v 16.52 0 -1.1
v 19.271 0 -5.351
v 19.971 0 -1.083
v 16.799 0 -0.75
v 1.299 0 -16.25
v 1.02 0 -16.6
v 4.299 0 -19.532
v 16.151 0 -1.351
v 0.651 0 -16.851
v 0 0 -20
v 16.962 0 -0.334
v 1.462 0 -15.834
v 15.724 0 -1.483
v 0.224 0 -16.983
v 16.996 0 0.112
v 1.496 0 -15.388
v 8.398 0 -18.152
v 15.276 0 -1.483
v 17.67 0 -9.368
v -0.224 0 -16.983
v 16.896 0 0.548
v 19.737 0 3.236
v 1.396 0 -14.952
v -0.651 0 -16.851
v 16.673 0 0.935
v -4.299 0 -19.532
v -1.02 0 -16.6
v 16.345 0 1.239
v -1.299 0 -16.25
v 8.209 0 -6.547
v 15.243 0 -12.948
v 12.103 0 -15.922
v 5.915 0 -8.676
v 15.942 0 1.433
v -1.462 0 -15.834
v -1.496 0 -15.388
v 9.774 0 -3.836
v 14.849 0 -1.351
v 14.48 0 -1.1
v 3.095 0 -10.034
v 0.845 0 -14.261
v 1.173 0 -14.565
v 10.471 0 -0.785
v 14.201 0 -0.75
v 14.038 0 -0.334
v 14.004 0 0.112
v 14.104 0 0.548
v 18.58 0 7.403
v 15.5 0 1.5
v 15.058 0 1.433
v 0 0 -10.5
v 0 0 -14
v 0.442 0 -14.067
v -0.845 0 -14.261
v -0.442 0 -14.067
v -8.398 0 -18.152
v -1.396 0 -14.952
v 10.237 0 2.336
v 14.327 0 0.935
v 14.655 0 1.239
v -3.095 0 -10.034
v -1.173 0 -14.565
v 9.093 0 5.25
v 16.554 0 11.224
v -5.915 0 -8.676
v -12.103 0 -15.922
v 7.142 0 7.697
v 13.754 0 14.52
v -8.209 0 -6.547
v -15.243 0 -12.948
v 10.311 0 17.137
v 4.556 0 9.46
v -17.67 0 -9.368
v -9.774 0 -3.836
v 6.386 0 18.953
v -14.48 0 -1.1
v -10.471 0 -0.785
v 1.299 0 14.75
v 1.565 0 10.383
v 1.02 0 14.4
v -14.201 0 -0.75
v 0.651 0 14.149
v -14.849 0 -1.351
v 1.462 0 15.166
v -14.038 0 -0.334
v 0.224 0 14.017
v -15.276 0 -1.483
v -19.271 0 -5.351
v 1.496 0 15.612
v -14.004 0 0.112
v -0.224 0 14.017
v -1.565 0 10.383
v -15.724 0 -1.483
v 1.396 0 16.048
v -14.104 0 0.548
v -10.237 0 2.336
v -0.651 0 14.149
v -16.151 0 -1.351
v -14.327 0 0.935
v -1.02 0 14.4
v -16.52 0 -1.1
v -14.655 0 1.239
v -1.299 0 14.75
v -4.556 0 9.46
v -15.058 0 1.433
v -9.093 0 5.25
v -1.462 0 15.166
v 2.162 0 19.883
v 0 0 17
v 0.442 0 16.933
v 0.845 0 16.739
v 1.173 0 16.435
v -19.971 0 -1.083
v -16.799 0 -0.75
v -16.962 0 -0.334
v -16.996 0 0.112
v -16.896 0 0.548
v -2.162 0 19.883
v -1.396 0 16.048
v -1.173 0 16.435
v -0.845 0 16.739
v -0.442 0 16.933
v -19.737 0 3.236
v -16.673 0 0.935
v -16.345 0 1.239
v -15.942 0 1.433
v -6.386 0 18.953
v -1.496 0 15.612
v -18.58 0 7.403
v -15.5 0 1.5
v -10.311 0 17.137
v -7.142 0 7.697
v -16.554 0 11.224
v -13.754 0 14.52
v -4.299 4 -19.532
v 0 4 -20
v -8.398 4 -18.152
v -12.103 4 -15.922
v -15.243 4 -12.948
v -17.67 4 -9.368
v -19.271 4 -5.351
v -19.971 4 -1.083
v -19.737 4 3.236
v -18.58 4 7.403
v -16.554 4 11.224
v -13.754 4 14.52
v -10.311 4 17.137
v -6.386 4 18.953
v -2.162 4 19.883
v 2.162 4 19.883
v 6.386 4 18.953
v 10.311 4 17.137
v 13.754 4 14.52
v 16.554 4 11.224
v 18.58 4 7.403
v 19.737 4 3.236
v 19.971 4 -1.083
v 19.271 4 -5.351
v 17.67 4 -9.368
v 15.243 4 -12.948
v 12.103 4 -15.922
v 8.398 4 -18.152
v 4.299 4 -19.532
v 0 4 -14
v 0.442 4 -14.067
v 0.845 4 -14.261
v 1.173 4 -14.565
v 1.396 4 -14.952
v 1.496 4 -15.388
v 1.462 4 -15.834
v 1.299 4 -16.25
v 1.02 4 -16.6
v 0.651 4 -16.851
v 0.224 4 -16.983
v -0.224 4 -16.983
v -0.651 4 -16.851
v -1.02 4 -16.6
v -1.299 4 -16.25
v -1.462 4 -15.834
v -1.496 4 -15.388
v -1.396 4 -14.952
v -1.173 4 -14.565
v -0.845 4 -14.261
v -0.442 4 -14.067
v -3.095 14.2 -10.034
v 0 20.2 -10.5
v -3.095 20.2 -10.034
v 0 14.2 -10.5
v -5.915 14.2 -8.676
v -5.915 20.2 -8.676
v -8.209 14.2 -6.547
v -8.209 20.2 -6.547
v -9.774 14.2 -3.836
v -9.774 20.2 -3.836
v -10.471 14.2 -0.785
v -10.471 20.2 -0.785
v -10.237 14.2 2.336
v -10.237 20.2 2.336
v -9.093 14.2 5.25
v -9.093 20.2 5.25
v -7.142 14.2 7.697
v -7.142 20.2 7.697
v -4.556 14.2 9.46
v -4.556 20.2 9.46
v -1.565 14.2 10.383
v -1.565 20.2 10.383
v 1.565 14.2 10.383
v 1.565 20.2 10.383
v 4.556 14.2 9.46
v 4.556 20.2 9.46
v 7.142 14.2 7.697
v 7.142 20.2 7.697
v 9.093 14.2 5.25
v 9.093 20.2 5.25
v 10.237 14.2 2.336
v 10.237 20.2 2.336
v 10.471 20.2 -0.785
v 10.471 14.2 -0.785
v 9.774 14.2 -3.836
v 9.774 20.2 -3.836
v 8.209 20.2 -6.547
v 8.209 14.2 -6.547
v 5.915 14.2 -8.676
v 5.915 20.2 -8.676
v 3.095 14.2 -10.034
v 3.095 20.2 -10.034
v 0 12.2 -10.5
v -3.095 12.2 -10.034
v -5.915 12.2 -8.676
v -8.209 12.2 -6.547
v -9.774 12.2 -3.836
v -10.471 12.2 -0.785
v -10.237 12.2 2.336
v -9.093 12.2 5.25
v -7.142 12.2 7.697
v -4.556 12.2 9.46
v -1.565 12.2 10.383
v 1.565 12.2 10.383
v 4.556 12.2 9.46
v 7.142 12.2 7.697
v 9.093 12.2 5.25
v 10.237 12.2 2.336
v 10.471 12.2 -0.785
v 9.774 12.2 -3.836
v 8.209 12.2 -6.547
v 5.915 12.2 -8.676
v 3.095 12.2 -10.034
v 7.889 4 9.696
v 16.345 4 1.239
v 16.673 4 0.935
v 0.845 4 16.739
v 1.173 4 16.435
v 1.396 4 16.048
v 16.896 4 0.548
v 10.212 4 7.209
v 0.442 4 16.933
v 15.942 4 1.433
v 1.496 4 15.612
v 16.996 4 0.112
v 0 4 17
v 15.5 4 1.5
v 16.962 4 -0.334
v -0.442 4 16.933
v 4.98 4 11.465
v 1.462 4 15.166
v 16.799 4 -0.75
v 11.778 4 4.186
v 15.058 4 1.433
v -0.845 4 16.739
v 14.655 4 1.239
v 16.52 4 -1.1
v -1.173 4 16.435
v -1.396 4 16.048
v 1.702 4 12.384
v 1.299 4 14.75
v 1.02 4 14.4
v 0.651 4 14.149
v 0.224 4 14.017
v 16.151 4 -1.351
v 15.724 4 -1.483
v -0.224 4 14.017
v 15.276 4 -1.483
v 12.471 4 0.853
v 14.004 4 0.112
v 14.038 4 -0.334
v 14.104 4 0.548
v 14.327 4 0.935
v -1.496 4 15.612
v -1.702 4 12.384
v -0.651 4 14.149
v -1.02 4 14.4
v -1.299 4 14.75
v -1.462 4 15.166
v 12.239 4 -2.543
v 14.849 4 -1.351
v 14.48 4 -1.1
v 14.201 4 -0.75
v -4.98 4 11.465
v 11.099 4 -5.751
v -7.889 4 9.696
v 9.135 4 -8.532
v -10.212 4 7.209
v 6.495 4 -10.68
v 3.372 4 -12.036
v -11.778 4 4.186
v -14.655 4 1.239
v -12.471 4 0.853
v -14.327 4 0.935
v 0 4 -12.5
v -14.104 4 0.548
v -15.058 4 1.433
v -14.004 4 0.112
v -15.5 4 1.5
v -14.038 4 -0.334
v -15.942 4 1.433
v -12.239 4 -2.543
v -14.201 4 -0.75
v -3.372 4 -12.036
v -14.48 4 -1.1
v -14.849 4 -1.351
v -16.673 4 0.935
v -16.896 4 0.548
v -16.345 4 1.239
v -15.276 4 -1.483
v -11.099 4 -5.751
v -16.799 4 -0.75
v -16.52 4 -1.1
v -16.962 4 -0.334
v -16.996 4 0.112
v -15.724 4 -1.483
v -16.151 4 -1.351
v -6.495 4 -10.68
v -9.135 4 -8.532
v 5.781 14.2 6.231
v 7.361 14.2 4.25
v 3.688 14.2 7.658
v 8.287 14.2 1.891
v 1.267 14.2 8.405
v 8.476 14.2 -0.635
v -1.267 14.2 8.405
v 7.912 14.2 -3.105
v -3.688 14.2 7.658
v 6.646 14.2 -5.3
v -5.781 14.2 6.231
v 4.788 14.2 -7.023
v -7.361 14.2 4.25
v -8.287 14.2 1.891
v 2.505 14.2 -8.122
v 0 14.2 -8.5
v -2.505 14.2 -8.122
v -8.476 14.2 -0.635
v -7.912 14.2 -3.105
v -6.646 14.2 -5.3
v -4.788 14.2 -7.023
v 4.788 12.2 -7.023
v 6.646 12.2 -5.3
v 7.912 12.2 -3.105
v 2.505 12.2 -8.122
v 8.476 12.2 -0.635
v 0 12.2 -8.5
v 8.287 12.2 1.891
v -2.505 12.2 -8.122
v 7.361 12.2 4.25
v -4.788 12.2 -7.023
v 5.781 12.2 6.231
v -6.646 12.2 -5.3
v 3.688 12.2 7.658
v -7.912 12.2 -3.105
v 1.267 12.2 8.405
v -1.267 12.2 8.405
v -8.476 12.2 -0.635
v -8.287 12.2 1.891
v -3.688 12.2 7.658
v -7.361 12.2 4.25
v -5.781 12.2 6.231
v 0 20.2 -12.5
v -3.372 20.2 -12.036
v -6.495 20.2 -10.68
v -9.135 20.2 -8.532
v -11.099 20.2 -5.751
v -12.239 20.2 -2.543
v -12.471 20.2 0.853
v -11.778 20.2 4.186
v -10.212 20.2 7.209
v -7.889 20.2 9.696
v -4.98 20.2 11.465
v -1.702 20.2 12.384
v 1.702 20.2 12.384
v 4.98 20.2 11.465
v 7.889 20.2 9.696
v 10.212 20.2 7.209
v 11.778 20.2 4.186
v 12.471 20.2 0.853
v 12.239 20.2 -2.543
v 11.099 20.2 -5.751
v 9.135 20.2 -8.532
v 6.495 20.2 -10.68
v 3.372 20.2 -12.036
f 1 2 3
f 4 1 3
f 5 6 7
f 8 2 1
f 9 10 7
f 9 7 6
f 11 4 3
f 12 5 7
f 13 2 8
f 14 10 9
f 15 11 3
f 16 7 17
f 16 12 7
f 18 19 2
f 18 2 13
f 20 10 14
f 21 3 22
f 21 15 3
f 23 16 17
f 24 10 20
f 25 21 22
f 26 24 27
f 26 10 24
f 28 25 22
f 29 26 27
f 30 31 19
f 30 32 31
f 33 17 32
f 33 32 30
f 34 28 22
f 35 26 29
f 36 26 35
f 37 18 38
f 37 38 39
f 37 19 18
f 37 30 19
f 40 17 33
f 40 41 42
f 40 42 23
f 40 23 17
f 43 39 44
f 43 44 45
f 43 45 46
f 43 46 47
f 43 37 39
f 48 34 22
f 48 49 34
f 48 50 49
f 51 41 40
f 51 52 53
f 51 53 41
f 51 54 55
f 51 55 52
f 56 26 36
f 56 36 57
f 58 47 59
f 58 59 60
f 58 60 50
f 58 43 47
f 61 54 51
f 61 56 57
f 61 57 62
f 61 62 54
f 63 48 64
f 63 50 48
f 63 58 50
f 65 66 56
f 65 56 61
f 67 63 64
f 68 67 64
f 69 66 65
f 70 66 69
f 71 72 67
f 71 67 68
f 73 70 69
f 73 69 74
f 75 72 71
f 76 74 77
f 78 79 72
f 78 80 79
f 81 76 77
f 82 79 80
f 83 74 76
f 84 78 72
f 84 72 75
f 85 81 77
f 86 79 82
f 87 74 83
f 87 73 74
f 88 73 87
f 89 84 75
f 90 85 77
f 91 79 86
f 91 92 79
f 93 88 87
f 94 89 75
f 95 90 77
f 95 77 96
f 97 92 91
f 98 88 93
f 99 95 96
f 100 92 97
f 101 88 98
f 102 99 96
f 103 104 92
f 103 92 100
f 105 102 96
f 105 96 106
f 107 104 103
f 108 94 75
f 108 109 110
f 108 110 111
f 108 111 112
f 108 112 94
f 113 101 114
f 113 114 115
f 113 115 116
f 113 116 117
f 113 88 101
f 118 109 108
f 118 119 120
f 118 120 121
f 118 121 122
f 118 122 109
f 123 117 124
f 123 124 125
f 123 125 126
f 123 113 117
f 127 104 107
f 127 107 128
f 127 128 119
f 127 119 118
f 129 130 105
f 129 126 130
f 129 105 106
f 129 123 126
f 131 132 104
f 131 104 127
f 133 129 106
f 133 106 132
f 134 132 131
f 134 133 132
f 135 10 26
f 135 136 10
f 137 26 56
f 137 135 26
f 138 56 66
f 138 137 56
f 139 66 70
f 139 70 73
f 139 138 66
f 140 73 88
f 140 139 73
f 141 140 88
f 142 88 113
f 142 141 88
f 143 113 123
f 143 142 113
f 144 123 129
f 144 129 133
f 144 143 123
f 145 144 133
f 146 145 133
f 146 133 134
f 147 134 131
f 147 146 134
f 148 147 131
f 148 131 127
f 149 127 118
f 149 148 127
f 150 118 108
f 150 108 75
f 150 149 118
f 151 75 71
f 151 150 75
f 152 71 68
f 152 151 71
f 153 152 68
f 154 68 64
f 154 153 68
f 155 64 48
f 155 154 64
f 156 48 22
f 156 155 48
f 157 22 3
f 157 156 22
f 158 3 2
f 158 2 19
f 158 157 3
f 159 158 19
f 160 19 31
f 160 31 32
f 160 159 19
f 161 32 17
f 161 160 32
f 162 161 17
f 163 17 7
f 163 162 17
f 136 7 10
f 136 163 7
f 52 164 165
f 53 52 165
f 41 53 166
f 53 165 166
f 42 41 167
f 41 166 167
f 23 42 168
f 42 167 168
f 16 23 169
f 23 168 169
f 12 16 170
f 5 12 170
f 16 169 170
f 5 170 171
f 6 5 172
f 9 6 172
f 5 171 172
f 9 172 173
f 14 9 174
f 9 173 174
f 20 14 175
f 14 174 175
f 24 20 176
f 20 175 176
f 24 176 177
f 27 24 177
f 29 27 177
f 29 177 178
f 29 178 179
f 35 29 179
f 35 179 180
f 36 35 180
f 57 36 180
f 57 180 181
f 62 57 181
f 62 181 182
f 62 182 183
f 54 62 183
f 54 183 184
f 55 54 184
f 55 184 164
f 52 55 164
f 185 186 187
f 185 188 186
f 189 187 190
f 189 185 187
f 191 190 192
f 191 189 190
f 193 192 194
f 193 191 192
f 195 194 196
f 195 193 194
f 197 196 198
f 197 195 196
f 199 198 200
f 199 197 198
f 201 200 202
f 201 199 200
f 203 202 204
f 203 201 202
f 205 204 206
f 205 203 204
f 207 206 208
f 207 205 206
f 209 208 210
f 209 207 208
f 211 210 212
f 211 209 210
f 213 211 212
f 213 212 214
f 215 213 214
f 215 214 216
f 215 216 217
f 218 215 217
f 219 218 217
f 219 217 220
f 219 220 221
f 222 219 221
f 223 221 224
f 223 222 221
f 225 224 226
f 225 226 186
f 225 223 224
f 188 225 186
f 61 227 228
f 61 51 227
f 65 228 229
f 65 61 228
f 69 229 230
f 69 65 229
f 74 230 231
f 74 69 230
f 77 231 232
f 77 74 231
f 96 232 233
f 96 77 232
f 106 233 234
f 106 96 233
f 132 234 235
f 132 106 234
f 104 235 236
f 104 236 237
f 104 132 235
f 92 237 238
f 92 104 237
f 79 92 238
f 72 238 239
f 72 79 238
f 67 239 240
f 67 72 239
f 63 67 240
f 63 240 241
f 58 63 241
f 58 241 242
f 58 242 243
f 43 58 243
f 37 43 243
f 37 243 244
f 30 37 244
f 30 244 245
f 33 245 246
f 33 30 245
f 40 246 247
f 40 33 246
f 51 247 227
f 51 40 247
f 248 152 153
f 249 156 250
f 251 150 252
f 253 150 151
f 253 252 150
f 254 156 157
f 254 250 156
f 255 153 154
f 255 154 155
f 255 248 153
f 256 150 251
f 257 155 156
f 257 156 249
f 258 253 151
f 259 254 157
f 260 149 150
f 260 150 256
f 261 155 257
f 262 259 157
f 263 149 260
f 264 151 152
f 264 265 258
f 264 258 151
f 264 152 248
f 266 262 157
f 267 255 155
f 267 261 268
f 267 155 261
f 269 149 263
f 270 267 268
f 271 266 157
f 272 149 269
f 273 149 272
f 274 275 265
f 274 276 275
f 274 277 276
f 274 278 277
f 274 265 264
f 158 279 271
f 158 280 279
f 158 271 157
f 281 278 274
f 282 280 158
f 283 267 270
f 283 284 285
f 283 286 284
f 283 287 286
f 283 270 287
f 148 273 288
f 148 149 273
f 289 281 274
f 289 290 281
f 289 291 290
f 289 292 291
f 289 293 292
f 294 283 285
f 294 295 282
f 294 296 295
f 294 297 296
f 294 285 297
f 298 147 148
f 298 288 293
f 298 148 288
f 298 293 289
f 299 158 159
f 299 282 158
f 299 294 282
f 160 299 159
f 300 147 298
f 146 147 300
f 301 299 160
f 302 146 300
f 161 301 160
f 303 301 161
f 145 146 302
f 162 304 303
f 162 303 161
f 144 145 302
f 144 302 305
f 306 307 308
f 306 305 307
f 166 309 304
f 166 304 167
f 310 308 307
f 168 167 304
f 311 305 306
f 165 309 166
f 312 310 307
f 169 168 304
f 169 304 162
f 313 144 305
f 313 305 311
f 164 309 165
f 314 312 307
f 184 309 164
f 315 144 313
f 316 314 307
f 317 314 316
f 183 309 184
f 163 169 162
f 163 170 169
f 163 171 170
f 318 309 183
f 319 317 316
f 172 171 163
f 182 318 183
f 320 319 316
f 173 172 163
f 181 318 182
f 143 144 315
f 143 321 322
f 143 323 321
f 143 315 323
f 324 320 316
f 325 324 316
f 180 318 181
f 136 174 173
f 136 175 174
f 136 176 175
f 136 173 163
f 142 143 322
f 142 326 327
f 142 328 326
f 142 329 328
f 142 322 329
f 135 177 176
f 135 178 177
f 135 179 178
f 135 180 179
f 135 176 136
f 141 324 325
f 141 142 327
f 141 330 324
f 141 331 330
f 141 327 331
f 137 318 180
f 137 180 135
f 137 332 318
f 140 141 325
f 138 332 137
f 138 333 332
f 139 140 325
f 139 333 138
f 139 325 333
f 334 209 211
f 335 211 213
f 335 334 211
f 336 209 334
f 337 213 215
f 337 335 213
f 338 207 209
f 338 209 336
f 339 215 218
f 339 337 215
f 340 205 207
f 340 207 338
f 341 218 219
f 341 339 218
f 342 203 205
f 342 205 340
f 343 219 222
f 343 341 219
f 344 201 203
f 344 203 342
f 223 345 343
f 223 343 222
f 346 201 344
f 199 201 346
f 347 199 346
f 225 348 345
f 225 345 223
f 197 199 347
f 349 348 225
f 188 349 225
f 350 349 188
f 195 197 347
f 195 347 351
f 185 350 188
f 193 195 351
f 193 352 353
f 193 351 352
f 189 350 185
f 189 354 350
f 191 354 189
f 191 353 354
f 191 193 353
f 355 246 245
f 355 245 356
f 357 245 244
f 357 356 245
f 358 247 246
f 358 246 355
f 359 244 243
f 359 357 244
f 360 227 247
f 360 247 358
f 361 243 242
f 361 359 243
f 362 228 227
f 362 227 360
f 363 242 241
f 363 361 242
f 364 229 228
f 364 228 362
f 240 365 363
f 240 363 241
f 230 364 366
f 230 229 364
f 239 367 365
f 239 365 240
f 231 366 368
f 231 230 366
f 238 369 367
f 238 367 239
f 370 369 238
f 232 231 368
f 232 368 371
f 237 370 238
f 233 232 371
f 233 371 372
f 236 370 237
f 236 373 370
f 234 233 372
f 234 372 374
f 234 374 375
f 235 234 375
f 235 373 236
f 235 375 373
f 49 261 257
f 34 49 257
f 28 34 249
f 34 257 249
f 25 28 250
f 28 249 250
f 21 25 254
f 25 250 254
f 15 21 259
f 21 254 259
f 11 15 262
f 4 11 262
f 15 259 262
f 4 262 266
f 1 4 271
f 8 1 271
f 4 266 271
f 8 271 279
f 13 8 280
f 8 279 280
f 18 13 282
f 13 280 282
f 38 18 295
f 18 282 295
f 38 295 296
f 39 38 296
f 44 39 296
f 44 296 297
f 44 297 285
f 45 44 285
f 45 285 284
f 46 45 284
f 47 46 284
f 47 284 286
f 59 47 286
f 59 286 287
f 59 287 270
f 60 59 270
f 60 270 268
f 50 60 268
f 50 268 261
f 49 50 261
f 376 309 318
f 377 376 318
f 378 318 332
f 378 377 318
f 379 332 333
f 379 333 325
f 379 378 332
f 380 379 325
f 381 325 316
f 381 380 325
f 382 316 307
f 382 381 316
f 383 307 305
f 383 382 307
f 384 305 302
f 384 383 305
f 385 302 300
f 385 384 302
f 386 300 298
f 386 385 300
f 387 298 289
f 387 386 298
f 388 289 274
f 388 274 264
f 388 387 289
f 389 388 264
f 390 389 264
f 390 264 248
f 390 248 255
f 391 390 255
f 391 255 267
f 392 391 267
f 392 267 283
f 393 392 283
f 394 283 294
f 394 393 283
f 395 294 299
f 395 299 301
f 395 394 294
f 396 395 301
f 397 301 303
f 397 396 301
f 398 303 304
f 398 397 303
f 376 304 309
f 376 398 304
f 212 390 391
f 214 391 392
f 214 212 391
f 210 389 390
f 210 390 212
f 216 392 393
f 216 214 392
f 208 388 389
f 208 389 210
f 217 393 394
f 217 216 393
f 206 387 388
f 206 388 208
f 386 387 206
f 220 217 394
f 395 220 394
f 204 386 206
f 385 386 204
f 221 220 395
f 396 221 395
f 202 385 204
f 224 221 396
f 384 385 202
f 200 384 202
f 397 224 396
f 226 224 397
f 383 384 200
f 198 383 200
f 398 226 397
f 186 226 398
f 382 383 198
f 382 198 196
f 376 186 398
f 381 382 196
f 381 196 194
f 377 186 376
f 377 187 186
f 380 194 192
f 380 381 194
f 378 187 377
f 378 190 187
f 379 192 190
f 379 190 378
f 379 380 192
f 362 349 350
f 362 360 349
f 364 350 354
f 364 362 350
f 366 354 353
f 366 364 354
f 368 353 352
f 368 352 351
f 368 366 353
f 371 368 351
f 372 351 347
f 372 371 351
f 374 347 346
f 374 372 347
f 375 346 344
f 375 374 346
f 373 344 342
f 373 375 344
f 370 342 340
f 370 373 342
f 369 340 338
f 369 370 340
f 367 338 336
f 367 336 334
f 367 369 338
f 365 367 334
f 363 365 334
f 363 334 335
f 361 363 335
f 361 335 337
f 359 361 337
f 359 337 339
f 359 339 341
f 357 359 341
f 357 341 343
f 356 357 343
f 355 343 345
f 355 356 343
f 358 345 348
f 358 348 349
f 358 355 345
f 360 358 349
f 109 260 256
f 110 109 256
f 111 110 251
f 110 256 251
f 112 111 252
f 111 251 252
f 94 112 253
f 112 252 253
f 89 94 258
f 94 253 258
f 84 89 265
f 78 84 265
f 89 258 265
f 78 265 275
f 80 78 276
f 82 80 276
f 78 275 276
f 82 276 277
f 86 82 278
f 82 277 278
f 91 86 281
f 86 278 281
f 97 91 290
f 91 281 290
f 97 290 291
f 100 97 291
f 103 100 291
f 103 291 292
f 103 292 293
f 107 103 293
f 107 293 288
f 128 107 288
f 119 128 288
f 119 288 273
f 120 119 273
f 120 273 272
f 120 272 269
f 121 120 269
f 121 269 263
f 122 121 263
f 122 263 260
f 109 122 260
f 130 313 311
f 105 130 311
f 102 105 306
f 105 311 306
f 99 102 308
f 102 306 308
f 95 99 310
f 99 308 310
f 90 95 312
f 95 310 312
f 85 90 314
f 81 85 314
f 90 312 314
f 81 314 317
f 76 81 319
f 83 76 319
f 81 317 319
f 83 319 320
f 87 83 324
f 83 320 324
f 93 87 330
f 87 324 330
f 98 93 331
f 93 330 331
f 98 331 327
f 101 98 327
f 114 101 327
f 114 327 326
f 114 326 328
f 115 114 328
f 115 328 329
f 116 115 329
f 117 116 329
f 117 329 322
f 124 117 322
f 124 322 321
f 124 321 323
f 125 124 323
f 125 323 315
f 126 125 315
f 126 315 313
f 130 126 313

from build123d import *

# Parameters (mm, degrees)
SKETCH2_R          = 1.5
CUT_EXTRUDE1_DEPTH = 33.595091655


with BuildPart() as part:
    # Sketch1 → Revolve1 (revolve)
    with BuildSketch(Plane.XY, mode=Mode.PRIVATE) as revolve1_sk:
        Polygon((-10.5, 20.2), (-10.5, 14.2), (-8.5, 14.2), (-8.5, 12.2), (-10.5, 12.2), (-10.5, 0), (-20, 0), (-20, 4), (-12.5, 4), (-12.5, 20.2), align=None)
    revolve(revolve1_sk.sketch.rotate(Axis((0, 0, 0), (0, 1, 0)), 270), axis=Axis((0, 0, 0), (0, 1, 0)))

    # Sketch2 → Cut-Extrude1 (cut, through all)
    with BuildSketch(Plane(origin=(0, 4, 0), x_dir=(1, 0, 0), z_dir=(0, 1, 0))):
        with Locations(Location((0, 15.5, 0), (0, 0, 270))):
            Circle(SKETCH2_R)
        with Locations(Location((15.5, 0, 0), (0, 0, 270))):
            Circle(SKETCH2_R)
        with Locations(Location((0, -15.5, 0), (0, 0, 270))):
            Circle(SKETCH2_R)
        with Locations(Location((-15.5, 0, 0), (0, 0, 270))):
            Circle(SKETCH2_R)
    extrude(amount=-CUT_EXTRUDE1_DEPTH, mode=Mode.SUBTRACT)


solid = part.part
